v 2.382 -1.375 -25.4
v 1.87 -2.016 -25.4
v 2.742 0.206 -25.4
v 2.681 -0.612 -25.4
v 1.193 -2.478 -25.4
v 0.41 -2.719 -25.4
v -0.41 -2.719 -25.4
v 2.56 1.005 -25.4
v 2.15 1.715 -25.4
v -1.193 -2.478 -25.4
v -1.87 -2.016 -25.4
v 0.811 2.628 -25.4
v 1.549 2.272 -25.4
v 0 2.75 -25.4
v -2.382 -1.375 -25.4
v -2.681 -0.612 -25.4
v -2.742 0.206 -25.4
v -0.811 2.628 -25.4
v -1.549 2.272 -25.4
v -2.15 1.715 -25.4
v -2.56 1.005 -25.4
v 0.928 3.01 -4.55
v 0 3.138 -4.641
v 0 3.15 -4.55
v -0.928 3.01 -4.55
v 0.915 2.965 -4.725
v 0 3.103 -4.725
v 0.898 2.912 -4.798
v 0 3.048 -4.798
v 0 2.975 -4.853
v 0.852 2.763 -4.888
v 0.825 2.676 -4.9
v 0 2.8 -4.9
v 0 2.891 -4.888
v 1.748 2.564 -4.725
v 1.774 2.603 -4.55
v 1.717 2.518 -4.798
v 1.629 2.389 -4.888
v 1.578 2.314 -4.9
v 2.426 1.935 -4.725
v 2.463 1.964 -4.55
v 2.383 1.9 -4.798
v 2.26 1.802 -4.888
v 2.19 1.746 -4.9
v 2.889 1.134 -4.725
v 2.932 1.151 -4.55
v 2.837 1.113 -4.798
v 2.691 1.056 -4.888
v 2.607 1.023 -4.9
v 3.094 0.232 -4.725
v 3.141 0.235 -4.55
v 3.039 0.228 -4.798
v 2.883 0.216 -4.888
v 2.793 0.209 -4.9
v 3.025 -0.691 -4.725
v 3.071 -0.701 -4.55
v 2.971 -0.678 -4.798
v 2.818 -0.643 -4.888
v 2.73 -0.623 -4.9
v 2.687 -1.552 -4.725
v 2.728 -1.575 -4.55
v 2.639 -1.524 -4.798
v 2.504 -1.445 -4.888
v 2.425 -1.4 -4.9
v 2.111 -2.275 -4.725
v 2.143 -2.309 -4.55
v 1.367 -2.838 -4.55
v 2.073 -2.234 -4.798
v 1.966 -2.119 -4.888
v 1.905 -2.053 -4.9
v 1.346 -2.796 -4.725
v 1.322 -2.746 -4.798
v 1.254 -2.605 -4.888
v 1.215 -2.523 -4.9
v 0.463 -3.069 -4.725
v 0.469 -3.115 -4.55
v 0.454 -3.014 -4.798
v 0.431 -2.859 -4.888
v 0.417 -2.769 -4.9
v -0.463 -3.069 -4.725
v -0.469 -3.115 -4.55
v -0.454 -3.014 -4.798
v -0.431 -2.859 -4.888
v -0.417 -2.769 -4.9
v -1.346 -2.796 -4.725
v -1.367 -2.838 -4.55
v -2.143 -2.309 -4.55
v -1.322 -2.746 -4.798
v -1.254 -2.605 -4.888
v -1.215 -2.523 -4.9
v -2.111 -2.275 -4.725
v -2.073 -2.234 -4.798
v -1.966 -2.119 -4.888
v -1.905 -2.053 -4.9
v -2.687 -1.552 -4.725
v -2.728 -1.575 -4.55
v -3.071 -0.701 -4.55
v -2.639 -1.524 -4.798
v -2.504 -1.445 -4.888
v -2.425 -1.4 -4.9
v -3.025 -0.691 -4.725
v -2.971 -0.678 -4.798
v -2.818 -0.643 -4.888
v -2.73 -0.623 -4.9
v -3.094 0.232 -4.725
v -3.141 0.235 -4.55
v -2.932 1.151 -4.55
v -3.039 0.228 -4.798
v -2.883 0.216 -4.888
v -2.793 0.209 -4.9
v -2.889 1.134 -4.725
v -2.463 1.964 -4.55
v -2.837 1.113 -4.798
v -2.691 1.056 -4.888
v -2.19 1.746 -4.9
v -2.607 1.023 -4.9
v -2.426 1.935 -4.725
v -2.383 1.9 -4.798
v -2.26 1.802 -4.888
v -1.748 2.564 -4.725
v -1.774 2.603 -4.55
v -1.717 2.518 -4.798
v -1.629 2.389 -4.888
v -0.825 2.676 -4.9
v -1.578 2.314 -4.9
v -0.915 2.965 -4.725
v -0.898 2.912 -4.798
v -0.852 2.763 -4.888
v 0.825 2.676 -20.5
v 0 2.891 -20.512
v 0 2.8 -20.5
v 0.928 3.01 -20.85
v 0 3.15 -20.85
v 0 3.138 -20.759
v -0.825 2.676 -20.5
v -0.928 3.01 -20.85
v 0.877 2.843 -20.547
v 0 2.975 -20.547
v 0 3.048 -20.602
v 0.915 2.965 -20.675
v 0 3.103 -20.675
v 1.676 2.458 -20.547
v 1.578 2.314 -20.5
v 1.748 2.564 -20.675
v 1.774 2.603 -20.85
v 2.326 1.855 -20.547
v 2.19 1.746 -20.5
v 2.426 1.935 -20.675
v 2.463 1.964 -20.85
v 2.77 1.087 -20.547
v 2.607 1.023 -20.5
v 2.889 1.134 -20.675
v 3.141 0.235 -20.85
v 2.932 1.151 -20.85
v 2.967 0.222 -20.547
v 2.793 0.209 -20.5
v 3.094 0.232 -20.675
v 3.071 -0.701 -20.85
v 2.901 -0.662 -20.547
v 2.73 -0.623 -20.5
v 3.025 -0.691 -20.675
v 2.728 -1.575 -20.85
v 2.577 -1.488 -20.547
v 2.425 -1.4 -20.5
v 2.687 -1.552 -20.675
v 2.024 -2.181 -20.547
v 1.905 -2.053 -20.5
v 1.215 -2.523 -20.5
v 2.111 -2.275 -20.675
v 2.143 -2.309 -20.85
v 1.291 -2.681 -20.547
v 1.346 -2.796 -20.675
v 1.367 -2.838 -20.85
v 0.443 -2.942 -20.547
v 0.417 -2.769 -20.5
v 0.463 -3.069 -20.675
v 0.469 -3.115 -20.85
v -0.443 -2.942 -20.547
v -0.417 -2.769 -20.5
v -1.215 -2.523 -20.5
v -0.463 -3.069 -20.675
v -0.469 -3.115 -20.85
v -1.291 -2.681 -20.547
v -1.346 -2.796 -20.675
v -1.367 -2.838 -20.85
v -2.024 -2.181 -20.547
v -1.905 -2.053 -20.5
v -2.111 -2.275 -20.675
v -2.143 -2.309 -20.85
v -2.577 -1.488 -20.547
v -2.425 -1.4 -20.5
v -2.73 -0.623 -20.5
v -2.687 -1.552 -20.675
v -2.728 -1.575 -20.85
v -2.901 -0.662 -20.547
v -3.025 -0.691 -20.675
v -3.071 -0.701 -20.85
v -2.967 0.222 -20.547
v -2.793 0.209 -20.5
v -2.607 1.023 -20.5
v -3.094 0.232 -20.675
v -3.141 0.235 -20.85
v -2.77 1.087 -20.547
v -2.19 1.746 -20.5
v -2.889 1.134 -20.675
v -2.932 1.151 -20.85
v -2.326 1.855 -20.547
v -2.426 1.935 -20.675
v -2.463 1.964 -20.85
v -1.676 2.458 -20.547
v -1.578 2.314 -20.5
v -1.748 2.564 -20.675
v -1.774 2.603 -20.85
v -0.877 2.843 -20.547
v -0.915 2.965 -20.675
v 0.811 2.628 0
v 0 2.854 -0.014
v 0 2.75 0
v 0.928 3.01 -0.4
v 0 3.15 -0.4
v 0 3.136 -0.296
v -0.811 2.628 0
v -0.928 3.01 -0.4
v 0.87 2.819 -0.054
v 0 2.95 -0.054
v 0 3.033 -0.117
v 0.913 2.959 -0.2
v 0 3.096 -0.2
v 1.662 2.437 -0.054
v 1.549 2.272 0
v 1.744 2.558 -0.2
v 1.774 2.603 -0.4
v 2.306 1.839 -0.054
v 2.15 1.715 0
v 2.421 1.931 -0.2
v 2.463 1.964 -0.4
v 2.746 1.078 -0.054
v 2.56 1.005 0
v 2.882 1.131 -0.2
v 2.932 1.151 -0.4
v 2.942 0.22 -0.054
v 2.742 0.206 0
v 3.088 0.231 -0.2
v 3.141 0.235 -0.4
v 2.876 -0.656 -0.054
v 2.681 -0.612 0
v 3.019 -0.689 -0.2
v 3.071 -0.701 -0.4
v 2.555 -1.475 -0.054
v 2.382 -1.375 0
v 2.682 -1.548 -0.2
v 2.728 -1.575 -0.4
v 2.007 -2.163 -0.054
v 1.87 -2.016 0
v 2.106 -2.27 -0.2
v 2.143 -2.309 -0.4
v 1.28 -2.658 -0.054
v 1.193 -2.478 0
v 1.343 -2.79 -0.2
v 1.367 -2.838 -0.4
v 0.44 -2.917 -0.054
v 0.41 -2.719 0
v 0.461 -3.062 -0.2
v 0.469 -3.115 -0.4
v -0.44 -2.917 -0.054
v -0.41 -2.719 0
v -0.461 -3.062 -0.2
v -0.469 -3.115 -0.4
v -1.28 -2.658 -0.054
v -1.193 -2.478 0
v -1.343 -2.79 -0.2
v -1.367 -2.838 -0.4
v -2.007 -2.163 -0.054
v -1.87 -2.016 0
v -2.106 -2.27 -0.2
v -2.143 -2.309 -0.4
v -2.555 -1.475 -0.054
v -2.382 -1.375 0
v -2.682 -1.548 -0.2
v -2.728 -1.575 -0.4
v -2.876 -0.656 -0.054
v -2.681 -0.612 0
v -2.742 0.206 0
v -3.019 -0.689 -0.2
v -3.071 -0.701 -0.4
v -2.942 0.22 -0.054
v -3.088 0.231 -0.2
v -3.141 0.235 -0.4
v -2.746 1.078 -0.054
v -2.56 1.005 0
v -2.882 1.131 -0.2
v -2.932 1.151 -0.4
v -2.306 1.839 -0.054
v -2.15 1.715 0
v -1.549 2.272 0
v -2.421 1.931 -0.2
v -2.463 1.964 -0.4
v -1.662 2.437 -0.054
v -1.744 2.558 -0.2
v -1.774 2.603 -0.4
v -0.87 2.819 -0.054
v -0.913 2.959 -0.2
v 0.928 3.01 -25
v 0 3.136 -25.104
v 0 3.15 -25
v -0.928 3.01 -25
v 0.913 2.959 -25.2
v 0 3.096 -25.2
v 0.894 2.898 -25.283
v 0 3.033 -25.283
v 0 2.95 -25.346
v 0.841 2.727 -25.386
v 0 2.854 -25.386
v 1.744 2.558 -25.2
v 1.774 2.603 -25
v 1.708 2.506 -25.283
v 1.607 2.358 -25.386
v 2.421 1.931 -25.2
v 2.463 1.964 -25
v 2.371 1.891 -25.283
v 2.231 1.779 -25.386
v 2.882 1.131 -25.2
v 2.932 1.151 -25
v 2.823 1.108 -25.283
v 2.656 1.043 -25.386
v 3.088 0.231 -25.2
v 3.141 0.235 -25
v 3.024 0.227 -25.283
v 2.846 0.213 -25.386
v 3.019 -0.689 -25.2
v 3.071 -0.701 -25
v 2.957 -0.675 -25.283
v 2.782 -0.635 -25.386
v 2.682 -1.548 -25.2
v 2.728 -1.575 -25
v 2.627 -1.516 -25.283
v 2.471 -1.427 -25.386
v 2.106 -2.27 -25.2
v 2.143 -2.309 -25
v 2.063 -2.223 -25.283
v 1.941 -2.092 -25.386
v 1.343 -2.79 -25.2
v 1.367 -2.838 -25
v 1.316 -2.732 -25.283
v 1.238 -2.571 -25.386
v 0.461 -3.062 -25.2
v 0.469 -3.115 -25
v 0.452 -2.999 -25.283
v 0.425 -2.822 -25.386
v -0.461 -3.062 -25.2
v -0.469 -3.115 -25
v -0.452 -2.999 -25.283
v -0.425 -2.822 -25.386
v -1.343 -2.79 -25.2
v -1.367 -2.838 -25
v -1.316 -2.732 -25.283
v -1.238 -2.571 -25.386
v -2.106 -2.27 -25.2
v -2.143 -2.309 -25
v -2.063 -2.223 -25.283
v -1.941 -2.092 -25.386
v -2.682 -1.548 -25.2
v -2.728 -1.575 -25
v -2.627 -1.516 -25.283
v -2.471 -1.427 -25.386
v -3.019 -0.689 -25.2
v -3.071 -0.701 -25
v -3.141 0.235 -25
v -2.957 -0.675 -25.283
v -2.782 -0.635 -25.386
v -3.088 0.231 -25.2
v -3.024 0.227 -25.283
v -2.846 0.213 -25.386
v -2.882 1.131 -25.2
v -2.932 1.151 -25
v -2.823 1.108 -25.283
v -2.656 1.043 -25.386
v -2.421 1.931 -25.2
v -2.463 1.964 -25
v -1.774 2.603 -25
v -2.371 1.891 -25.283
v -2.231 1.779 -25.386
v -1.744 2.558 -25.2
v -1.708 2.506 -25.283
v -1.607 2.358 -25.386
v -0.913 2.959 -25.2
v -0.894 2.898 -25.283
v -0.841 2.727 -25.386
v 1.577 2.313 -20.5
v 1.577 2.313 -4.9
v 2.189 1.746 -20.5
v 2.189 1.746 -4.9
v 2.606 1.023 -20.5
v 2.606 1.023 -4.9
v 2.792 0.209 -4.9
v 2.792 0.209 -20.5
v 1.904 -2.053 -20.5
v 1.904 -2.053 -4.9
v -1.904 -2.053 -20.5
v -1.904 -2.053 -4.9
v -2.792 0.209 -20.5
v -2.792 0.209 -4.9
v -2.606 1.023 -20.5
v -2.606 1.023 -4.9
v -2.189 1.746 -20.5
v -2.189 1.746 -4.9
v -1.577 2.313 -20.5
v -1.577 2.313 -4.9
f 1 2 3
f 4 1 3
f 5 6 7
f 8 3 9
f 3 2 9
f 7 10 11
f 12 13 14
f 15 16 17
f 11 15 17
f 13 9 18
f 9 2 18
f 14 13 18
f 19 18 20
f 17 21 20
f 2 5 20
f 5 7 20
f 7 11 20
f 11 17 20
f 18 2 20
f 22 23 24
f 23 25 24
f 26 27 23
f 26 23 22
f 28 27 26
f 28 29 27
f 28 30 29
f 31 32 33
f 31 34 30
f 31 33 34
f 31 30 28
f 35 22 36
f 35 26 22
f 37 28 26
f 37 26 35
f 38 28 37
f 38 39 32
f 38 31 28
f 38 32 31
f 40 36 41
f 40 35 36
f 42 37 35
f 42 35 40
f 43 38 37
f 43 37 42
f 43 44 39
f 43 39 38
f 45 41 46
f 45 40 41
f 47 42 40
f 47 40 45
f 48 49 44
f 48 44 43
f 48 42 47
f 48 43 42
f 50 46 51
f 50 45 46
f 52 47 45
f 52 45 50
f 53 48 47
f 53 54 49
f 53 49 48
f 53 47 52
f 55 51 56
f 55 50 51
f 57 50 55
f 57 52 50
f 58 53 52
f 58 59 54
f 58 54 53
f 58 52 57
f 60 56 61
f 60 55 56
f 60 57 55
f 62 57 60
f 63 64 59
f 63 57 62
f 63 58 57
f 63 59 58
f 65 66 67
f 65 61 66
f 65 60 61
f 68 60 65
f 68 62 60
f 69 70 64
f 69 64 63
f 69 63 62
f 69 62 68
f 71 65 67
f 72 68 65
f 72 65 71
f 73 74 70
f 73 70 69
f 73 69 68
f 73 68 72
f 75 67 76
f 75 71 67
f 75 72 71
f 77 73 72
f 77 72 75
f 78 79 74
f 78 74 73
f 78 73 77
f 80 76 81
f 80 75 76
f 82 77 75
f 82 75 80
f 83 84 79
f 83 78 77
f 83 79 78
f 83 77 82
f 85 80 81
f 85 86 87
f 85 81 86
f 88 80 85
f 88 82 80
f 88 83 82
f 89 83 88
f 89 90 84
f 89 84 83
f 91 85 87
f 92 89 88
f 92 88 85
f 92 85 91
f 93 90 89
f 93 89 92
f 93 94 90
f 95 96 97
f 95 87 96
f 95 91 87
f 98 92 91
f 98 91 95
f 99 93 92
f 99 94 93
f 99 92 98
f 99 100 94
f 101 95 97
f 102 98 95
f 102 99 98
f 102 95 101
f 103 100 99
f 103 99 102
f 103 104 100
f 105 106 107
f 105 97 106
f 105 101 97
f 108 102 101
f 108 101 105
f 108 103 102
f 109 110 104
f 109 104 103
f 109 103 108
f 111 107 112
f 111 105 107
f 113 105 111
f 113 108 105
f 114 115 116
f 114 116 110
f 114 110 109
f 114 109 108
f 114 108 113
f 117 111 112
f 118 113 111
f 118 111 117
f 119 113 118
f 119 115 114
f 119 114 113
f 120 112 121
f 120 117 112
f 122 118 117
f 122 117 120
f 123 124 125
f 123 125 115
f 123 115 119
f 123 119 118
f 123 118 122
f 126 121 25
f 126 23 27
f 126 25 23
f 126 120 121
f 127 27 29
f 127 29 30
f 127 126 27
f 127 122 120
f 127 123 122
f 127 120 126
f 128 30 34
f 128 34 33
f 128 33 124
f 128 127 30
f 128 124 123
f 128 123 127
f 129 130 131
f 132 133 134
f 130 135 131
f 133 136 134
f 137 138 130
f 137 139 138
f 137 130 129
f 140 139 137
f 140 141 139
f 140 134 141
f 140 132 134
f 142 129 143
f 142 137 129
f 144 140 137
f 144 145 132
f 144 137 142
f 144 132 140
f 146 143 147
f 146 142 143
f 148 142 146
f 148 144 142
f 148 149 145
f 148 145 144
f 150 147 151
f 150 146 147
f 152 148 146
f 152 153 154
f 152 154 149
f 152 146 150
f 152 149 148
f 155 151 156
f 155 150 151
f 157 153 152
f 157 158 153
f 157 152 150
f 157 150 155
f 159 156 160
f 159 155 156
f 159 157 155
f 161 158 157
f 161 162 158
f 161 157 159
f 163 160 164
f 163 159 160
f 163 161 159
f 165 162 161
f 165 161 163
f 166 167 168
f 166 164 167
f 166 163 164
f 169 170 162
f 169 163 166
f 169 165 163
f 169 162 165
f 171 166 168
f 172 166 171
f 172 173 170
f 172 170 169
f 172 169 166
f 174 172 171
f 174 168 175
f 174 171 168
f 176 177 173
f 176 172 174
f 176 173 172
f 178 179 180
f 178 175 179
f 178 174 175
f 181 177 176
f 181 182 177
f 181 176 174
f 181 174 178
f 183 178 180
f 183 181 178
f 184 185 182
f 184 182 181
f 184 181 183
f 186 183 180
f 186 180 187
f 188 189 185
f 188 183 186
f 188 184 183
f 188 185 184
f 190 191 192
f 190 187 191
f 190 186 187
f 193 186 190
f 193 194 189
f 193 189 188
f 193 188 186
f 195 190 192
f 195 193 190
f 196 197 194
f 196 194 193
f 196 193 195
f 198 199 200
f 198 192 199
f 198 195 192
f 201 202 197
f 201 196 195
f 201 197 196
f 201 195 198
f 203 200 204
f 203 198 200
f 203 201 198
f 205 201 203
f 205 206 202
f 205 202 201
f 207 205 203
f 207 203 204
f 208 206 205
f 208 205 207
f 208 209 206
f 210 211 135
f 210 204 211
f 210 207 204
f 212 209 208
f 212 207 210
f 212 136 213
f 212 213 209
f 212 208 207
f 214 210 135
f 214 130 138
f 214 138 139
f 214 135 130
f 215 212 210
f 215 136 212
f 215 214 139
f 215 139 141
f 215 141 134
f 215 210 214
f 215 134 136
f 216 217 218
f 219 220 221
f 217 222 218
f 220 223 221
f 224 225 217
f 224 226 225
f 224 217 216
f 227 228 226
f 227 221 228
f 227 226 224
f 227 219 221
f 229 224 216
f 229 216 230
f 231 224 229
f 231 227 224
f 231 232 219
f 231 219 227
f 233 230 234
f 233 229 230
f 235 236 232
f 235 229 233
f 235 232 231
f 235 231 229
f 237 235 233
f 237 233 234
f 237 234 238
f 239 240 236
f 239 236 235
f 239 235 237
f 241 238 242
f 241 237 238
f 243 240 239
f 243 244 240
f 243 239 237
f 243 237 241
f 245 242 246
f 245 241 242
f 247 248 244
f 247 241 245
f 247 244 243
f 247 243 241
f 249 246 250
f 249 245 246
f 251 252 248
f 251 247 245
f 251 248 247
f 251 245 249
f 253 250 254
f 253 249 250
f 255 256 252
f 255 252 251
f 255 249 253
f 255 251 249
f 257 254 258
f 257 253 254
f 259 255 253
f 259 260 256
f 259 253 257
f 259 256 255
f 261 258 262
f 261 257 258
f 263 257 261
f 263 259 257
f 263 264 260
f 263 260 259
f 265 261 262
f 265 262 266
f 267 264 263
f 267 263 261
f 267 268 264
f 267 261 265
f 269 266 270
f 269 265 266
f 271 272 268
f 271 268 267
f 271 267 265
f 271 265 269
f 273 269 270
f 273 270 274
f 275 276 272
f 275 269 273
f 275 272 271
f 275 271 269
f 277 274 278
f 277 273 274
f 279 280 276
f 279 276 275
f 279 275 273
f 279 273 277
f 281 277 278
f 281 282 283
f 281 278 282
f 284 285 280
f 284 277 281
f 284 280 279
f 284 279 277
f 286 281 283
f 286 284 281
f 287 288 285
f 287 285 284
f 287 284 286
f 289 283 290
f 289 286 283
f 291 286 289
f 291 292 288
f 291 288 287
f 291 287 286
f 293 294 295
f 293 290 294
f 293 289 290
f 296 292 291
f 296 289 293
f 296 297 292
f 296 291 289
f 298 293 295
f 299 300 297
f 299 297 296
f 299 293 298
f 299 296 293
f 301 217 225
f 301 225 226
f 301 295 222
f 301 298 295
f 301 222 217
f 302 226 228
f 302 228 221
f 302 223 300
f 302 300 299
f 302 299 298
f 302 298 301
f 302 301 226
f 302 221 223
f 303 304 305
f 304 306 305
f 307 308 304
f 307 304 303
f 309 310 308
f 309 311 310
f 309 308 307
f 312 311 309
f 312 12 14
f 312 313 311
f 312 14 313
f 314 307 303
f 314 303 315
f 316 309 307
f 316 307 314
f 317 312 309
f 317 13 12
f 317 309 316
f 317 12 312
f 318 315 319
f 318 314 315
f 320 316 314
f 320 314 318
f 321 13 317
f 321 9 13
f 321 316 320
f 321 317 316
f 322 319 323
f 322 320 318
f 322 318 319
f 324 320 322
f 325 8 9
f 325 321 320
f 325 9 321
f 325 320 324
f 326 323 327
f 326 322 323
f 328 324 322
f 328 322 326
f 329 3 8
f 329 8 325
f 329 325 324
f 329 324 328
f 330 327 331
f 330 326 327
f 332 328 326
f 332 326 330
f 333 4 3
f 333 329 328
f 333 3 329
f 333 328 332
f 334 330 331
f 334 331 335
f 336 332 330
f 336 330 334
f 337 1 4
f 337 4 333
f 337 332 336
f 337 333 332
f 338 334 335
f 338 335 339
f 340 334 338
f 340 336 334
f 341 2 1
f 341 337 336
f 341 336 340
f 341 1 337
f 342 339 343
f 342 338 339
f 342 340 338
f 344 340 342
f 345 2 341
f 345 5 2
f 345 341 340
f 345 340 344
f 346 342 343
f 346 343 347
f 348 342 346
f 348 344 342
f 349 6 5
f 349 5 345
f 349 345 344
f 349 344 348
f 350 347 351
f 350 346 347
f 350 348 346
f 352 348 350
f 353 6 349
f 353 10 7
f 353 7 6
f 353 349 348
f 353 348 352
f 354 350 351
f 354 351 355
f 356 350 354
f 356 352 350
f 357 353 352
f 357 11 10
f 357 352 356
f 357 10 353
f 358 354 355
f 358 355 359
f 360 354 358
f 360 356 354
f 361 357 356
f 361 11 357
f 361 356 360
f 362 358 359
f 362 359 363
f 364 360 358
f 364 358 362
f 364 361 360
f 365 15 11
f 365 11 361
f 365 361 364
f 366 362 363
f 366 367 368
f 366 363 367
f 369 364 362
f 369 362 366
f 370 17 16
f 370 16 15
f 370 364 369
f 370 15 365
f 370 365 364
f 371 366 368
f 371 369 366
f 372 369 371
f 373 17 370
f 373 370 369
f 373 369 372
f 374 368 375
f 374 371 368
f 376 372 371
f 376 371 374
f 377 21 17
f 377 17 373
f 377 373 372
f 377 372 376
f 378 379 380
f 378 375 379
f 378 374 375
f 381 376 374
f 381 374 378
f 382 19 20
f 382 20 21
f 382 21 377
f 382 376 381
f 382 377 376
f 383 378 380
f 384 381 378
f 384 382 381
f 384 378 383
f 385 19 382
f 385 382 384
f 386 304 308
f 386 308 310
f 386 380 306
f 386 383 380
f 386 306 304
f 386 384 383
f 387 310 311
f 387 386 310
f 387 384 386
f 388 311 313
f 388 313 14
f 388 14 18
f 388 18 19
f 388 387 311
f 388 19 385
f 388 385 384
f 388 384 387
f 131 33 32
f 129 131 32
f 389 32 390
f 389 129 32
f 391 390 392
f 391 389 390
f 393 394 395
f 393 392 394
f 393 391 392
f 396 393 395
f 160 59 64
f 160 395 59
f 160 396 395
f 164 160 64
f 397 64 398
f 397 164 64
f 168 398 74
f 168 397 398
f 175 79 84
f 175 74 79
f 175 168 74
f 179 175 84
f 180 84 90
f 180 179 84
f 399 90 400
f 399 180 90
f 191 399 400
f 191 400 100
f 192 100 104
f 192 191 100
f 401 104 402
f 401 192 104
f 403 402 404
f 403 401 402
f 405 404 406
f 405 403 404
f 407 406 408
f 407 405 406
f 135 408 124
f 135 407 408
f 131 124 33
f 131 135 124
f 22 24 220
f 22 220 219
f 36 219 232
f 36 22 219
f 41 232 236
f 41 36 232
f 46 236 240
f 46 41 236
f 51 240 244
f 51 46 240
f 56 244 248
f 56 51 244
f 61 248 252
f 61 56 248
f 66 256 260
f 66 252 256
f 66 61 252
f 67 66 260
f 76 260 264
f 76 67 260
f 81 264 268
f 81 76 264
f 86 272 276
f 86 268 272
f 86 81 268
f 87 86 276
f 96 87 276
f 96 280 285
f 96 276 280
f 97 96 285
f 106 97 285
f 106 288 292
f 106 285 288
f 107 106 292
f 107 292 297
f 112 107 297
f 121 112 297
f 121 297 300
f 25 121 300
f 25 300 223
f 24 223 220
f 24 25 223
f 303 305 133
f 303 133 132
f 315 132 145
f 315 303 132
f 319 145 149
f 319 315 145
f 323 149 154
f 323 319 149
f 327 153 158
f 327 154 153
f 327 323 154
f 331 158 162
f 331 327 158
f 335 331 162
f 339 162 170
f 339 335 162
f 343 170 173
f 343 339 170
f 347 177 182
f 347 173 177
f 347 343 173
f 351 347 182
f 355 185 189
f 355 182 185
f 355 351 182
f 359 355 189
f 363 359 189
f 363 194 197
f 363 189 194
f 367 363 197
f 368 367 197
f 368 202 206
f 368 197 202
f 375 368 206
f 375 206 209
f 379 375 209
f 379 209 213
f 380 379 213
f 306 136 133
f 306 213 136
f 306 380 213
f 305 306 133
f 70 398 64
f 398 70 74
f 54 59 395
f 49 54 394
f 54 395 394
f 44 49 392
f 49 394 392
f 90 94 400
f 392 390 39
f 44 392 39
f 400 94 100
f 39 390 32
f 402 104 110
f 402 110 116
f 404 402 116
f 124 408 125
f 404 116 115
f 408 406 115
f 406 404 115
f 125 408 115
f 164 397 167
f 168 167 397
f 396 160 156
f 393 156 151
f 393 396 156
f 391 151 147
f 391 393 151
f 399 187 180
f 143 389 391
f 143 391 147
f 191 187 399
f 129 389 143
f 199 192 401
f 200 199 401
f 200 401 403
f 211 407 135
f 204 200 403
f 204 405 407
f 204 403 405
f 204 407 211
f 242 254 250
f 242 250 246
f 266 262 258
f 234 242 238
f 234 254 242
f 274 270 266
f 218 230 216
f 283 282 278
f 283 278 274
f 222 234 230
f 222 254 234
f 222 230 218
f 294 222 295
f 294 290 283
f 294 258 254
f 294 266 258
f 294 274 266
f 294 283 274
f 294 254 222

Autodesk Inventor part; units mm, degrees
ref_plane "YZ Plane" through (0, 0, 0) normal (1, 0, 0) x (0, 1, 0)
ref_plane "XZ Plane" through (0, 0, 0) normal (0, 1, 0) x (-1, 0, 0)
ref_plane "XY Plane" through (0, 0, 0) normal (0, 0, 1) x (1, 0, 0)
sketch "Sketch2" plane through (0, 0, 0) normal (1, 0, 0) x (0, 1, 0)
  line L0 (0, 0) -> (3.15, 0)
  line L1 (3.15, 0) -> (3.15, -4.9)
  line L2 (3.15, -4.9) -> (2.8, -4.9)
  line L3 (2.8, -4.9) -> (2.8, -20.5)
  line L4 (2.8, -20.5) -> (3.15, -20.5)
  line L5 (3.15, -20.5) -> (3.15, -25.4)
  line L6 (3.15, -25.4) -> (0, -25.4)
  line L7 (0, -25.4) -> (0, 0)
  dimension "d1" = 3.15
  dimension "d2" = 4.9
  dimension "d3" = 0.35
  dimension "d4" = 15.6
  dimension "d5" = 0.35
  dimension "d6" = 4.9
  dimension "d7" = 3.15
revolve "Revolution1" add sketch "Sketch2" angle 360 about axis through (0, 0, -25.4) along (0, 0, 1)
fillet "Fillet4" radius 0.4 2 edges at (0, -3.15, -25.4) (0, -3.15, 0)
fillet "Fillet5" radius 0.35 2 edges at (0, -3.15, -20.5) (0, -3.15, -4.9)
equation "\"d5\" = d3"
equation "\"d6\" = d2"
equation "\"d7\" = d1"
properties part number "Fusible de 13A"
